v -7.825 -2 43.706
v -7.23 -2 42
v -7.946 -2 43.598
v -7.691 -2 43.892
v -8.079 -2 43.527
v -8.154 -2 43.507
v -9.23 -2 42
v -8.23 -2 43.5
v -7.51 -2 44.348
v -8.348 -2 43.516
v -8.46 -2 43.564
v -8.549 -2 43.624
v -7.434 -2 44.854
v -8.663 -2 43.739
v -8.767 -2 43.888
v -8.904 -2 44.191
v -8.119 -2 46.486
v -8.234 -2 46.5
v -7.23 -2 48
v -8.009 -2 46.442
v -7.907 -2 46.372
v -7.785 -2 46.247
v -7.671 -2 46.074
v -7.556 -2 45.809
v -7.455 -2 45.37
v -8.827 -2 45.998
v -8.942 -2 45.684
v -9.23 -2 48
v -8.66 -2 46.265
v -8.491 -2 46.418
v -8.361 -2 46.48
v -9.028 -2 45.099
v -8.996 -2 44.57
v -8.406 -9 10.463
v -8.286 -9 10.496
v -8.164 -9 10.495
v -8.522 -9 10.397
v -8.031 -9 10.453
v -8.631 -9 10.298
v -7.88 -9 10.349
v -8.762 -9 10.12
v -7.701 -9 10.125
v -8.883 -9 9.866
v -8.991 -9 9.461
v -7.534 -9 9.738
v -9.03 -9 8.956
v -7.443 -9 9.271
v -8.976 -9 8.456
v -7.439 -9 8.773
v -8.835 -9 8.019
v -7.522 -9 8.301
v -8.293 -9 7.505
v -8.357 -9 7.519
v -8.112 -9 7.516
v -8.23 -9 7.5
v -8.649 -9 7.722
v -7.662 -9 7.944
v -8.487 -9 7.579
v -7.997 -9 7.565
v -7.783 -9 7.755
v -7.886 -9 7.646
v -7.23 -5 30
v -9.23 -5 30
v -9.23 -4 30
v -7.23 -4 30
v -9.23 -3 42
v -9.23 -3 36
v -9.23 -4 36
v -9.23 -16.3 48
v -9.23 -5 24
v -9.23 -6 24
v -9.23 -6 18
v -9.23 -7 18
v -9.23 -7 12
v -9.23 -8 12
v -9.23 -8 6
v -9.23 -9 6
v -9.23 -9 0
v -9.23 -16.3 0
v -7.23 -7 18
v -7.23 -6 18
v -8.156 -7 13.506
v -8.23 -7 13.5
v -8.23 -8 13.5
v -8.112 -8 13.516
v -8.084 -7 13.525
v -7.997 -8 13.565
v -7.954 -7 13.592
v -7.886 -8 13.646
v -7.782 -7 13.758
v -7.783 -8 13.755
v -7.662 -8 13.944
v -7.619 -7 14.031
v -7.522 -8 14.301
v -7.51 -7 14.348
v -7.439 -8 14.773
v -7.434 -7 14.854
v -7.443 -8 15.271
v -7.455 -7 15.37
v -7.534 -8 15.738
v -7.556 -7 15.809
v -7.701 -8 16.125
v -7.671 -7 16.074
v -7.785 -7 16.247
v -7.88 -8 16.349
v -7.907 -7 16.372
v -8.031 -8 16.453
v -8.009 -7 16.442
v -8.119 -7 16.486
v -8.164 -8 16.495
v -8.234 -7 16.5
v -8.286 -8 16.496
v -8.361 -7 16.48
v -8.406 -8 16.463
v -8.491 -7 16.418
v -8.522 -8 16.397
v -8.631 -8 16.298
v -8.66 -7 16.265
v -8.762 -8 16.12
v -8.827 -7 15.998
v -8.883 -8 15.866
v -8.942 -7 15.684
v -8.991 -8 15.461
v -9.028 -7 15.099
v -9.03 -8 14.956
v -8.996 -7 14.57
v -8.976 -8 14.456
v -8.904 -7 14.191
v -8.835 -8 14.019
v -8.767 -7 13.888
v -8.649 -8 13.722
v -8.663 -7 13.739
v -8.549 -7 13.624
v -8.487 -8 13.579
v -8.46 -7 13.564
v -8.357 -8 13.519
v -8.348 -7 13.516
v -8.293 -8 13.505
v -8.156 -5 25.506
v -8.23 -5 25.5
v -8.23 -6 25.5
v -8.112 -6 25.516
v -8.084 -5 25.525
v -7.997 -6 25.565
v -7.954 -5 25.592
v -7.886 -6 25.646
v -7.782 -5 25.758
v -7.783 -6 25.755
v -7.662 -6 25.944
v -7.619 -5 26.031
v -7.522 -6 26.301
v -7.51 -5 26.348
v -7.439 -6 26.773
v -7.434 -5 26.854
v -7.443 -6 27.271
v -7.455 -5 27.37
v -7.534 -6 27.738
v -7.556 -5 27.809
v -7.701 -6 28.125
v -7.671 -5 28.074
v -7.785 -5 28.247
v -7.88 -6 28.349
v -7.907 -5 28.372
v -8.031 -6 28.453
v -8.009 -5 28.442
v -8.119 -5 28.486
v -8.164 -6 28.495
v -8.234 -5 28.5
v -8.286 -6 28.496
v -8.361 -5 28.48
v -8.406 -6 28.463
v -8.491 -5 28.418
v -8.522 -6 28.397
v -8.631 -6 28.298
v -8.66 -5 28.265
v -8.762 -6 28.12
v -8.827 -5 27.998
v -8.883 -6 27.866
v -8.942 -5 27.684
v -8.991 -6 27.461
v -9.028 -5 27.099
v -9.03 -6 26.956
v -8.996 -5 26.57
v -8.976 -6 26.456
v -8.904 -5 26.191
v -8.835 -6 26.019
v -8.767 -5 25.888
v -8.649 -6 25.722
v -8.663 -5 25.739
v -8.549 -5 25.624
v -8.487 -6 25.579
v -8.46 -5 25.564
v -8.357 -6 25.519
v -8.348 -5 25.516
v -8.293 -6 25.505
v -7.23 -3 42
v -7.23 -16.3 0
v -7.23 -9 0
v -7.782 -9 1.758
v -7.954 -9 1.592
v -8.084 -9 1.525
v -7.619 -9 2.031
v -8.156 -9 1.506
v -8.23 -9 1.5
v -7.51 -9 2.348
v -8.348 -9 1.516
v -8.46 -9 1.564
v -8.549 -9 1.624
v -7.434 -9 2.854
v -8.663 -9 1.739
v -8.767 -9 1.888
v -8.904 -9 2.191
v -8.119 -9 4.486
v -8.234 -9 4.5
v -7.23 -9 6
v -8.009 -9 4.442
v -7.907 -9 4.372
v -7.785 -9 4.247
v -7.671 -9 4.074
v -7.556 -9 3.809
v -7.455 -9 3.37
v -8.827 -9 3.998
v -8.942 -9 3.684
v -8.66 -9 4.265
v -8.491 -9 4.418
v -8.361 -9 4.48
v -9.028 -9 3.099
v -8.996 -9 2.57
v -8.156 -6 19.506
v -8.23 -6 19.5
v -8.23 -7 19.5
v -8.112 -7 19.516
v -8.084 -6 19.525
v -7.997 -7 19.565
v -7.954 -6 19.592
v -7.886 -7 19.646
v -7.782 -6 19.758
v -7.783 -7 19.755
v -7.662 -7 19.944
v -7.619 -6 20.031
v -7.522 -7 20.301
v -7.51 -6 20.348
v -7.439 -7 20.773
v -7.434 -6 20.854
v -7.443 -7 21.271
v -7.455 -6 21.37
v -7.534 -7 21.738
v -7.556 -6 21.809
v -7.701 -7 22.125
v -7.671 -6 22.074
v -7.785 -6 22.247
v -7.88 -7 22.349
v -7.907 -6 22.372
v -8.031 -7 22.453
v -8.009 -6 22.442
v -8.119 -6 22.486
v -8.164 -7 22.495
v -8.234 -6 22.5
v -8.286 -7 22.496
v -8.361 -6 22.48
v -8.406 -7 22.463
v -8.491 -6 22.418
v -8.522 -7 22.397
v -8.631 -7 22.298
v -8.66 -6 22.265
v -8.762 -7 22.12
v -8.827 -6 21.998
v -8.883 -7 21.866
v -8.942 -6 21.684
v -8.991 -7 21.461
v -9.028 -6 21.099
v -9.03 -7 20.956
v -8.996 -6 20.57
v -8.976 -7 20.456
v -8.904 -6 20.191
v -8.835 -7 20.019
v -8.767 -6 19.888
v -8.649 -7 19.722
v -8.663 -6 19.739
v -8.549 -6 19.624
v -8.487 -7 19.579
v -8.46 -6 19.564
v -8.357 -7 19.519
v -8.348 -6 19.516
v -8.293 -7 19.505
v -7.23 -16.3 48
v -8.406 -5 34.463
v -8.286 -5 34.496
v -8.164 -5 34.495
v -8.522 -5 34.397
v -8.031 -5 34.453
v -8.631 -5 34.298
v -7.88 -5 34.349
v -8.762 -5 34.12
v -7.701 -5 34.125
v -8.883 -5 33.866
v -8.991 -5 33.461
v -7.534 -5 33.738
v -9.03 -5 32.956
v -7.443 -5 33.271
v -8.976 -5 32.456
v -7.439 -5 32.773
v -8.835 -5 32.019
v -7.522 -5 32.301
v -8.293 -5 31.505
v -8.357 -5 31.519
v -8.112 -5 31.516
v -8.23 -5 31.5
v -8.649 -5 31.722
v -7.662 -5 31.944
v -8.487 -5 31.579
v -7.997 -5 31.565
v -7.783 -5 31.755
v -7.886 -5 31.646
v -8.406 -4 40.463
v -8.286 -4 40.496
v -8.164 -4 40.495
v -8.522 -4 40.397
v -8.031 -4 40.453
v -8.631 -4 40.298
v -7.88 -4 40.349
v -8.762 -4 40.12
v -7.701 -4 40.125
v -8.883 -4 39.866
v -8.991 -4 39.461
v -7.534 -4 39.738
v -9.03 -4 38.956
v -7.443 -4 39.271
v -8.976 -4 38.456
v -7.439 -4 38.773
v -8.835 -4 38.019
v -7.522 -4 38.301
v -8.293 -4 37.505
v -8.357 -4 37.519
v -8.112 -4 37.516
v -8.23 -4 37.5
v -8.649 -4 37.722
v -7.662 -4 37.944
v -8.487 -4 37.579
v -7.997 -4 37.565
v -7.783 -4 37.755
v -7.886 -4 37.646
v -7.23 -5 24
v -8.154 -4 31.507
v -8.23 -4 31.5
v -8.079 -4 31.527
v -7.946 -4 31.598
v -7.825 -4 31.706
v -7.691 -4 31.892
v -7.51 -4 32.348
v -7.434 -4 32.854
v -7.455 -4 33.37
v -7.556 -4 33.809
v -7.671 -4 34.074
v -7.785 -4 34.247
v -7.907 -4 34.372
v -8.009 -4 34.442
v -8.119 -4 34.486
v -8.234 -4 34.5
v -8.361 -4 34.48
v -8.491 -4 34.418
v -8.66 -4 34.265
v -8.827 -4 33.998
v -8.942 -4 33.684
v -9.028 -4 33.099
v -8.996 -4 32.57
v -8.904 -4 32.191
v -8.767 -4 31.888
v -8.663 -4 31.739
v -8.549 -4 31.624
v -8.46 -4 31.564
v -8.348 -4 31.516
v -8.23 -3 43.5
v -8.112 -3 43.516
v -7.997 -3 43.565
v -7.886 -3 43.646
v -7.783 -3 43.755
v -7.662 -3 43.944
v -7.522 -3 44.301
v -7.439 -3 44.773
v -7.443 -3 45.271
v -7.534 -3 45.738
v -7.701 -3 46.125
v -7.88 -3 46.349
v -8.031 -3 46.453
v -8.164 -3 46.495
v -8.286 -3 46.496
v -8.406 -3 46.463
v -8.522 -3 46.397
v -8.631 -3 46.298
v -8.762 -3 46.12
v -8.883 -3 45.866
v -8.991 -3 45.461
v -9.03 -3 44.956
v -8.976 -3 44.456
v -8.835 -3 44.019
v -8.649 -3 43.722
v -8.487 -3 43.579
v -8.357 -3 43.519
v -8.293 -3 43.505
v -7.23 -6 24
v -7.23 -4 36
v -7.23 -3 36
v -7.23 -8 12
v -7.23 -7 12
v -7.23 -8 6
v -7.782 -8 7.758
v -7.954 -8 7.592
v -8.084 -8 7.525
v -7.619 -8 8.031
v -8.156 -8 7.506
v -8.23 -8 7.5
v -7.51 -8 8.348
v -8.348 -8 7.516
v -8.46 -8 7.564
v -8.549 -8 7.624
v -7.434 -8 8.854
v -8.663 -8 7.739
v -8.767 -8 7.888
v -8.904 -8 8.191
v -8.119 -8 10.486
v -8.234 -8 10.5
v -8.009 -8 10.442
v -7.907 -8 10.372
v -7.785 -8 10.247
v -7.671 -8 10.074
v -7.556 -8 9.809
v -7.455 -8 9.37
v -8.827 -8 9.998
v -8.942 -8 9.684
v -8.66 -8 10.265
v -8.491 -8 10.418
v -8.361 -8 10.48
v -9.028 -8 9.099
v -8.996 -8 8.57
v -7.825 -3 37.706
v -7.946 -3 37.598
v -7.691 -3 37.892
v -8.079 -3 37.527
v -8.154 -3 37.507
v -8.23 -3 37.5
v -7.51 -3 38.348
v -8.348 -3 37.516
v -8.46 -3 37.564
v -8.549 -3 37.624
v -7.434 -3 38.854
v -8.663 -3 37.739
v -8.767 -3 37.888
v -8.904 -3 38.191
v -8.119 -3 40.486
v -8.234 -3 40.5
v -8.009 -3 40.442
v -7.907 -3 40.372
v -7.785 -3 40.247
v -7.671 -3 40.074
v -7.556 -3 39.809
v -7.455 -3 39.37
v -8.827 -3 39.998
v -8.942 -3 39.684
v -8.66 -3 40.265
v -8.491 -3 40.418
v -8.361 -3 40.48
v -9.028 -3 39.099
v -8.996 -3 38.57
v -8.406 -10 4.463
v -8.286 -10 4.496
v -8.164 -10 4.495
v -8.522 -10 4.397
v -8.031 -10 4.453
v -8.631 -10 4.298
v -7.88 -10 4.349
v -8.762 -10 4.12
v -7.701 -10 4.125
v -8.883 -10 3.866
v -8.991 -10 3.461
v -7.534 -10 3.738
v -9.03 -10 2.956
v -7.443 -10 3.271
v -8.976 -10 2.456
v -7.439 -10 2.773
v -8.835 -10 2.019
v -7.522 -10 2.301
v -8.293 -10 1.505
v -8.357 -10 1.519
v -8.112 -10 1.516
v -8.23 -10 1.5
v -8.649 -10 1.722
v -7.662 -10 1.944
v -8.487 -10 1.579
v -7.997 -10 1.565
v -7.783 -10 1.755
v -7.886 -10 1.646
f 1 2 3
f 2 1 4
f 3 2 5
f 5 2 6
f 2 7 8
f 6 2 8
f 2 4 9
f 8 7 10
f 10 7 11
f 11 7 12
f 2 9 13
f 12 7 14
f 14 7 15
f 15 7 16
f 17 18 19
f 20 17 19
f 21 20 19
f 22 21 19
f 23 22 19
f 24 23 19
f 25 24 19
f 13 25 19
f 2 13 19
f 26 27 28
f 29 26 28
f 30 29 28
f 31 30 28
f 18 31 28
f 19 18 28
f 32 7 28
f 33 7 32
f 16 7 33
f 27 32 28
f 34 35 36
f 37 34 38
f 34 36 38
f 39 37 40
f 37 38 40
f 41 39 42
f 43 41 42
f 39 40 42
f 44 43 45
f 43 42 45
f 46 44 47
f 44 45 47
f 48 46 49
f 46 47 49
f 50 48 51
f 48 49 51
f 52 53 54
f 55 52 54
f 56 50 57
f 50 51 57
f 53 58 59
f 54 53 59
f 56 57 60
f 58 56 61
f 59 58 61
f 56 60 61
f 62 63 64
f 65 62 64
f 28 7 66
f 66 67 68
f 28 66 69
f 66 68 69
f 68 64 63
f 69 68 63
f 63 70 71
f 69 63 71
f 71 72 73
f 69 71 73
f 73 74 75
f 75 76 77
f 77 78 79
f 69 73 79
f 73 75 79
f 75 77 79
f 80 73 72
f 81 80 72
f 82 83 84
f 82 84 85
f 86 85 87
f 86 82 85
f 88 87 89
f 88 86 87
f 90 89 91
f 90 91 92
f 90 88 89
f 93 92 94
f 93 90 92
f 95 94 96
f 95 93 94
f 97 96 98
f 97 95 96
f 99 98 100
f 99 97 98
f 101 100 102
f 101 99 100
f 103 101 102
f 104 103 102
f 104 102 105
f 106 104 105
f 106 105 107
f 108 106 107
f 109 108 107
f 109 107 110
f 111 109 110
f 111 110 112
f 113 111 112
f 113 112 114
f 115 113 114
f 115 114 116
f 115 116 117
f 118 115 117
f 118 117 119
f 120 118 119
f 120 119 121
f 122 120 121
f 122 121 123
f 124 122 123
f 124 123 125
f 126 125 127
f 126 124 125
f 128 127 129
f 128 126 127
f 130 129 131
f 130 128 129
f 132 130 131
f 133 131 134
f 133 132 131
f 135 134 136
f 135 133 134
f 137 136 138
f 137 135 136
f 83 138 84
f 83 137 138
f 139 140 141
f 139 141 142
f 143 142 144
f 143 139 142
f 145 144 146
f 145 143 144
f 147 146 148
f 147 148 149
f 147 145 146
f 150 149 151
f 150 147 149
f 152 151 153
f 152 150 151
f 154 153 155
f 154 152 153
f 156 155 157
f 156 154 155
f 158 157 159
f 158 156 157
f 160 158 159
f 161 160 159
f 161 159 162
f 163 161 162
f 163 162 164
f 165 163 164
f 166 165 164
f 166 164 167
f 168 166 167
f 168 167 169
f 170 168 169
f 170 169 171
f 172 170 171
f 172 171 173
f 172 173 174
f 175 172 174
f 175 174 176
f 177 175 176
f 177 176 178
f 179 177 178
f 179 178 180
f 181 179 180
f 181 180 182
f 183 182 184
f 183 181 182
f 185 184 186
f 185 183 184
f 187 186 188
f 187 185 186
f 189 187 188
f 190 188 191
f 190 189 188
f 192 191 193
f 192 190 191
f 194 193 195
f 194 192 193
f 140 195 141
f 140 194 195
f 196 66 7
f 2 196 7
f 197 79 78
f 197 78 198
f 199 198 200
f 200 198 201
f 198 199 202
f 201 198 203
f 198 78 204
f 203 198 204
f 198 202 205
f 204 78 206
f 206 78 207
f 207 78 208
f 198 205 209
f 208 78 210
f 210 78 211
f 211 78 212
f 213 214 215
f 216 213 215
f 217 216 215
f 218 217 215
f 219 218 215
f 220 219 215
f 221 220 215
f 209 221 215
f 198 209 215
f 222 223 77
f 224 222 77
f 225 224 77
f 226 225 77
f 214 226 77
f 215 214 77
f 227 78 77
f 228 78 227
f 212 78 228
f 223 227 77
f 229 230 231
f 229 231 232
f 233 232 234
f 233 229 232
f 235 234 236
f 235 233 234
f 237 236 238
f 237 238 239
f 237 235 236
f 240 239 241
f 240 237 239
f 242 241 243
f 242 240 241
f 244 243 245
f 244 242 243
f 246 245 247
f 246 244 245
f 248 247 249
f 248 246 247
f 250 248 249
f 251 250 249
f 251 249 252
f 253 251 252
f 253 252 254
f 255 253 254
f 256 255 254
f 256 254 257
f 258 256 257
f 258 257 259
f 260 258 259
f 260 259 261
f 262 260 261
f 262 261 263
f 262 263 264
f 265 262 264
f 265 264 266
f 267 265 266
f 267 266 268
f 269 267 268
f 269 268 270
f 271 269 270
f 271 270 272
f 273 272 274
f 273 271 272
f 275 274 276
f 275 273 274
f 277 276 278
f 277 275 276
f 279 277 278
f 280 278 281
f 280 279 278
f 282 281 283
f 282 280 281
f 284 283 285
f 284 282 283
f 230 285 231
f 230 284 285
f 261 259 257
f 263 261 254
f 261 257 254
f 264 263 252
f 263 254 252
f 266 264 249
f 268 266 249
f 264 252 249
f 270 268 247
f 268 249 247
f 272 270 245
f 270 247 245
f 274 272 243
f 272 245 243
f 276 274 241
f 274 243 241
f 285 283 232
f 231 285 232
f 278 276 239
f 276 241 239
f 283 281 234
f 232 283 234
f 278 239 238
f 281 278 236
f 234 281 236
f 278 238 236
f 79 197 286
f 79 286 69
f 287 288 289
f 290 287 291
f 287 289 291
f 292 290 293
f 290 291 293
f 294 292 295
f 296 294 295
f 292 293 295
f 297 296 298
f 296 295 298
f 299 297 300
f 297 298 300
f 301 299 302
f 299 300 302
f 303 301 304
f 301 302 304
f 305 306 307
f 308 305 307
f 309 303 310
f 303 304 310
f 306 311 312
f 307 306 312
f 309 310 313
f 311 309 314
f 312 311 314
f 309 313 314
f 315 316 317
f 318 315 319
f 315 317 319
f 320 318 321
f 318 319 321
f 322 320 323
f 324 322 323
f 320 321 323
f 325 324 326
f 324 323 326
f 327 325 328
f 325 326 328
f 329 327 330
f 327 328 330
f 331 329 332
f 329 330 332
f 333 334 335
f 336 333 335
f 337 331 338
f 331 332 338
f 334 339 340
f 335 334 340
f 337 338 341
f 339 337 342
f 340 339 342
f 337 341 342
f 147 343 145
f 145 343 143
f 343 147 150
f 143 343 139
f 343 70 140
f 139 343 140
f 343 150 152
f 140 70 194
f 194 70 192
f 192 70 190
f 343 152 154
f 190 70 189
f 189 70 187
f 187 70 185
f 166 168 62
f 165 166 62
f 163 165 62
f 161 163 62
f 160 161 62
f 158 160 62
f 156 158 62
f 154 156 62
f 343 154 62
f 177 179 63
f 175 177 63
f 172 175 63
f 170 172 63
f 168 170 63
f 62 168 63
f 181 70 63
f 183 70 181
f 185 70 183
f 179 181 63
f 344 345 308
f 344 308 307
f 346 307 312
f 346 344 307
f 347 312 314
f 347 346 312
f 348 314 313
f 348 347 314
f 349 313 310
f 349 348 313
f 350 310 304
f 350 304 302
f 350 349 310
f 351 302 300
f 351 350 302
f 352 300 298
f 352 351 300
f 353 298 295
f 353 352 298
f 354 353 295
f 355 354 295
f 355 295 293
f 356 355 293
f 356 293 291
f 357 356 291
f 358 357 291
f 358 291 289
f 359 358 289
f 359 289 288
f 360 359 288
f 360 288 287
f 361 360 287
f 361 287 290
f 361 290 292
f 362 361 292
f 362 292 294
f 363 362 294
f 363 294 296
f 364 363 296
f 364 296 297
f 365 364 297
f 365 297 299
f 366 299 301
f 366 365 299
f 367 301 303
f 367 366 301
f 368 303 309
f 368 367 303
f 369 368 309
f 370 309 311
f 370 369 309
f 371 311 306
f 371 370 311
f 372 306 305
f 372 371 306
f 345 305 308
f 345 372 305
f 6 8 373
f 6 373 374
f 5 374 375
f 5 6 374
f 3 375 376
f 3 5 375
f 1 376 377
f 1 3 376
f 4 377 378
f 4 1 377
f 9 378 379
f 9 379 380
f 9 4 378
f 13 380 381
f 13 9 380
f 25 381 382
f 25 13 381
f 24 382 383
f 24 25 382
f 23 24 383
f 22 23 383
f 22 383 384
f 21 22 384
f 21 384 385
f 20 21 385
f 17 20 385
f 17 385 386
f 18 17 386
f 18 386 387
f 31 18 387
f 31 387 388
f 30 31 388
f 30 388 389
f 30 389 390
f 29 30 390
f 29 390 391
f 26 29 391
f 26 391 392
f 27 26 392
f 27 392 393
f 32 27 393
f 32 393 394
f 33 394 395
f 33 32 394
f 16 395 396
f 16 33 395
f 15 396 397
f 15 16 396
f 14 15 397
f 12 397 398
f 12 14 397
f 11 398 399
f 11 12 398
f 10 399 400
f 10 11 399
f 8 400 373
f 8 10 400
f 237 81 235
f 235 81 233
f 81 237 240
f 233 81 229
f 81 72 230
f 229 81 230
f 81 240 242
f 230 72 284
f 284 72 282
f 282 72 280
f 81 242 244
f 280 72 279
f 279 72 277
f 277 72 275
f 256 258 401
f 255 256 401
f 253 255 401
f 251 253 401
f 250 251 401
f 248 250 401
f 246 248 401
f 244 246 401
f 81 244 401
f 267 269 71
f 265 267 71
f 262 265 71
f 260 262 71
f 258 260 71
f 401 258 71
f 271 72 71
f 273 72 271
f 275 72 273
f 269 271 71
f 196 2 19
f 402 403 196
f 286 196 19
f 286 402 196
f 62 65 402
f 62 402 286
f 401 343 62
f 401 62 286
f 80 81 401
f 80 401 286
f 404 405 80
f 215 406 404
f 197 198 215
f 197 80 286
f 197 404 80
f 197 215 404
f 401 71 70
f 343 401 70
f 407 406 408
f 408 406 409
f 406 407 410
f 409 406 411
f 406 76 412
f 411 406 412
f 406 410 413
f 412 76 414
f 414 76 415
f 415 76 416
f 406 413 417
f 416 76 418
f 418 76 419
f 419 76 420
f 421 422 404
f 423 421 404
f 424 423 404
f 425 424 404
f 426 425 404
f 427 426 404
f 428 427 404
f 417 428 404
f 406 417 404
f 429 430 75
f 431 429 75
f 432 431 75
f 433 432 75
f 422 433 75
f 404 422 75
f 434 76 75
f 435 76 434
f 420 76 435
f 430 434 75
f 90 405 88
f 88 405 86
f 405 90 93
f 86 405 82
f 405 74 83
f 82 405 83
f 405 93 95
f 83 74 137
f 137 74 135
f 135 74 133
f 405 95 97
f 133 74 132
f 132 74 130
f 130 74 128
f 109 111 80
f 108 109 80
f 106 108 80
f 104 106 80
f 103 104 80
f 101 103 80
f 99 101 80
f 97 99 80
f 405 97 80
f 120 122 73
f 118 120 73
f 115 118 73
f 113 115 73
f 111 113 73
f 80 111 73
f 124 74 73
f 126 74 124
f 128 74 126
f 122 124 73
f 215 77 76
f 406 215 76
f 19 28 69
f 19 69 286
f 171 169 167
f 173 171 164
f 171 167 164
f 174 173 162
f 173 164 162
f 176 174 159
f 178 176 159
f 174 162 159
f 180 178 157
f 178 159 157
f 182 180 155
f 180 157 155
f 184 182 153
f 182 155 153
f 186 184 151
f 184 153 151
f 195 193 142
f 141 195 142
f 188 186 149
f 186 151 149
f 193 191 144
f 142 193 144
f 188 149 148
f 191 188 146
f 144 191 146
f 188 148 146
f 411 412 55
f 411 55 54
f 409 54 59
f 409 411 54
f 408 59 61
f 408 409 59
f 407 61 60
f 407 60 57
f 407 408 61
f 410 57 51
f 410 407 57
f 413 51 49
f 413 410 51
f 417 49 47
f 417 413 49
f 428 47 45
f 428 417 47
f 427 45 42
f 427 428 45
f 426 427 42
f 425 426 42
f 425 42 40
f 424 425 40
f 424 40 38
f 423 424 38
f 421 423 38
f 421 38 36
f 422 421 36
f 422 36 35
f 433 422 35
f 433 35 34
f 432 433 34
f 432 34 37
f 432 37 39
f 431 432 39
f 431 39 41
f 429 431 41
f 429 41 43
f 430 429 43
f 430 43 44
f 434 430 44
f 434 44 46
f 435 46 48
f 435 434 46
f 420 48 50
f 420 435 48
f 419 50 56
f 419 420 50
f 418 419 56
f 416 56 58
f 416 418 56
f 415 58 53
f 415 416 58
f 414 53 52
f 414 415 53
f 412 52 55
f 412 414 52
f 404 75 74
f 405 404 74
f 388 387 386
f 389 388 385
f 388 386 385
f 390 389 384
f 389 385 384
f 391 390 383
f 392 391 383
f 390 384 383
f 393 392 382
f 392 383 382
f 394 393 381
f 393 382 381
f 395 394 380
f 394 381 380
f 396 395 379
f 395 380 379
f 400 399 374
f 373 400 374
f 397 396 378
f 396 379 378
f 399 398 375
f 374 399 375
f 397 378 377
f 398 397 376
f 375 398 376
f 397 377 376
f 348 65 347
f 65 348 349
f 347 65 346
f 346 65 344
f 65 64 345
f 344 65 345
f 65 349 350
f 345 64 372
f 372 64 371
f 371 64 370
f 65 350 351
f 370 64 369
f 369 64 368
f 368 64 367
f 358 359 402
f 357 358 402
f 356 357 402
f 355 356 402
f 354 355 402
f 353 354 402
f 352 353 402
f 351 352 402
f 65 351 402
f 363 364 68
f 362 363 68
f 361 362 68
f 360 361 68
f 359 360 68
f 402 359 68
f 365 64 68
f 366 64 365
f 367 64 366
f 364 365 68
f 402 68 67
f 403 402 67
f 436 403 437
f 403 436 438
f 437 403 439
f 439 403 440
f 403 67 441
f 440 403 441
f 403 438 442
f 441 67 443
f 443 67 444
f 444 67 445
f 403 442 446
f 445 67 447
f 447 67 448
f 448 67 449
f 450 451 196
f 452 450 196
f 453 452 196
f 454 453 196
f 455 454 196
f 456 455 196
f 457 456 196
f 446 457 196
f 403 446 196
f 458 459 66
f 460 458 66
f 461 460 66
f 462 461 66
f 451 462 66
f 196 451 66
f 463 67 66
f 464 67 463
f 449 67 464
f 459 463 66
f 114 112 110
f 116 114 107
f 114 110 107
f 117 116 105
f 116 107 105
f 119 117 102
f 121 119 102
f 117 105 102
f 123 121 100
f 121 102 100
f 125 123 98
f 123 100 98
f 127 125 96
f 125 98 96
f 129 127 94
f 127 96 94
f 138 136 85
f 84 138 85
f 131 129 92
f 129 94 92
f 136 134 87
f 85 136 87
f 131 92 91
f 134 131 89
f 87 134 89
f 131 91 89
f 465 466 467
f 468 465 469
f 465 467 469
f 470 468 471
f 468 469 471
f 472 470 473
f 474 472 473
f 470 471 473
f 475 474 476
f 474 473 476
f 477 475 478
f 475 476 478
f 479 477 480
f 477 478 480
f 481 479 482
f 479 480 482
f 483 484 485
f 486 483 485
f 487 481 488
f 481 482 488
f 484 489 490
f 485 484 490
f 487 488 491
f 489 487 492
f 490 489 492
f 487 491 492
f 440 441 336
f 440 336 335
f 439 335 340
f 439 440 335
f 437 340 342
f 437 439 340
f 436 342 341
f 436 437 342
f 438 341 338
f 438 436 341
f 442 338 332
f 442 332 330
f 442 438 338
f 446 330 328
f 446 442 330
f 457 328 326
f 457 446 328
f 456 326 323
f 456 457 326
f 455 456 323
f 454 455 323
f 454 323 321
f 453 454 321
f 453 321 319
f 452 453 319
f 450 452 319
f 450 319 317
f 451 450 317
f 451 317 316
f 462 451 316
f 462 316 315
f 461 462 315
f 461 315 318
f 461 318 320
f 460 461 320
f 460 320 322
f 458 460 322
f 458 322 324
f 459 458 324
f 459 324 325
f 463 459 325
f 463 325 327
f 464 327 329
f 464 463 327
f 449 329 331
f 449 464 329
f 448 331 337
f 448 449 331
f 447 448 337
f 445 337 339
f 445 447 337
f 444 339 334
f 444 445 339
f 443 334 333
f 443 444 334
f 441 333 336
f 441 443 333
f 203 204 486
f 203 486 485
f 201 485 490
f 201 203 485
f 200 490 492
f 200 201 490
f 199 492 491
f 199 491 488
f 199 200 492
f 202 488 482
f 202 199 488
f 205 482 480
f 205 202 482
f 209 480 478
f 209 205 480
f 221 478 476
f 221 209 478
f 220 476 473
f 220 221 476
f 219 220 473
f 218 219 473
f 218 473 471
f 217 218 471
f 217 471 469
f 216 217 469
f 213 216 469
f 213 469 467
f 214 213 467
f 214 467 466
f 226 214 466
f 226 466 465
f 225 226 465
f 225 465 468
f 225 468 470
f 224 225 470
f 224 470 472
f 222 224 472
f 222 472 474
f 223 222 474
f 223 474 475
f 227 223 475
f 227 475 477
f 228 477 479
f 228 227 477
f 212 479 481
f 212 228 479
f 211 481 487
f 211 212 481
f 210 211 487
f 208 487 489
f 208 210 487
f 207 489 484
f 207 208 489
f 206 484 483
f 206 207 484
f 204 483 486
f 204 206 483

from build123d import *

# Parameters (mm, degrees)
BOSS_EXTRUDE1_DEPTH      = 48
CUT_EXTRUDE4_DEPTH       = 2
CUT_EXTRUDE6_DEPTH       = 9
CUT_EXTRUDE6_DEPTH_BACK  = 1
SKETCH8_RX               = 1.5
SKETCH8_RY               = 0.8
CUT_EXTRUDE7_DEPTH       = 11
CUT_EXTRUDE7_DEPTH_BACK  = 1
SKETCH13_RX              = 1.5
SKETCH13_RY              = 0.8
CUT_EXTRUDE8_DEPTH       = 13
CUT_EXTRUDE8_DEPTH_BACK  = 1
SKETCH14_RX              = 1.5
SKETCH14_RY              = 0.8
CUT_EXTRUDE9_DEPTH       = 15
CUT_EXTRUDE9_DEPTH_BACK  = 1
SKETCH15_RX              = 1.5
SKETCH15_RY              = 0.8
CUT_EXTRUDE10_DEPTH      = 17
CUT_EXTRUDE10_DEPTH_BACK = 1
SKETCH16_RX              = 1.5
SKETCH16_RY              = 0.8
CUT_EXTRUDE11_DEPTH      = 19
CUT_EXTRUDE11_DEPTH_BACK = 1
SKETCH17_RX              = 1.5
SKETCH17_RY              = 0.8
CUT_EXTRUDE12_DEPTH      = 21
CUT_EXTRUDE12_DEPTH_BACK = 1
SKETCH18_RX              = 1.5
SKETCH18_RY              = 0.8
CUT_EXTRUDE13_DEPTH      = 23
CUT_EXTRUDE13_DEPTH_BACK = 1
SKETCH19_RX              = 1.5
SKETCH19_RY              = 0.8
SKETCH21_W               = 58.141640115
SKETCH21_H               = 26.059597095
CUT_EXTRUDE14_DEPTH      = 22
BODY_MOVE_COPY1_ANGLE    = 180


with BuildPart() as part:
    # Sketch2 → Boss-Extrude1 (new body)
    with BuildSketch(Plane.XY):
        Polygon((-7.23, -20.3), (-7.23, -34), (-9.23, -34), (-9.23, -2), (-7.23, -2), align=None)
    extrude(amount=BOSS_EXTRUDE1_DEPTH)

    # Sketch7 → Cut-Extrude4 (cut)
    with BuildSketch(Plane(origin=(-7.23, 0, 0), x_dir=(0, 0, -1), z_dir=(1, 0, 0))):
        Polygon((-48, -16.3), (-48, -24.3), (-42, -24.3), (-42, -25.3), (-36, -25.3), (-36, -26.3), (-30, -26.3), (-30, -27.3), (-24, -27.3), (-24, -28.3), (-18, -28.3), (-18, -29.3), (-12, -29.3), (-12, -30.3), (-6, -30.3), (-6, -31.3), (0, -31.3), (0, -9.3), (-6, -9.3), (-6, -10.3), (-12, -10.3), (-12, -11.3), (-18, -11.3), (-18, -12.3), (-24, -12.3), (-24, -13.3), (-30, -13.3), (-30, -14.3), (-36, -14.3), (-36, -15.3), (-42, -15.3), (-42, -16.3), align=None)
    extrude(amount=-CUT_EXTRUDE4_DEPTH, mode=Mode.SUBTRACT)


with BuildPart() as cut_extrude4_piece_1:
    # of the separate pieces the step leaves, piece 1, a body of its own (cut_extrude4_pieces)
    add(part.part.solids().sort_by_distance((-7.23, -9.3, 0))[0])


with BuildPart() as cut_extrude4_piece_2:
    # of the separate pieces the step leaves, piece 2, a body of its own (cut_extrude4_pieces)
    add(part.part.solids().sort_by_distance((-7.23, -34, 0))[0])


with BuildPart() as cut_extrude6_tool:
    # Sketch8 → Cut-Extrude6 (new, two sides: drawn at the far end of the back side and taken through both)
    with BuildSketch(Plane(origin=(0, -24.3, 0), x_dir=(1, 0, 0), z_dir=(0, 1, 0)).offset(-CUT_EXTRUDE6_DEPTH_BACK)):
        with Locations(Location((-8.23, -45), (0, 0, 90))):
            Ellipse(SKETCH8_RX, SKETCH8_RY)
    extrude(amount=CUT_EXTRUDE6_DEPTH + CUT_EXTRUDE6_DEPTH_BACK)


with BuildPart() as cut_extrude4_piece_1_1:
    add(cut_extrude4_piece_1.part)

    # Cut-Extrude6: cut by cut_extrude6_tool
    add(cut_extrude6_tool.part, mode=Mode.SUBTRACT)


with BuildPart() as cut_extrude4_piece_2_1:
    add(cut_extrude4_piece_2.part)

    # Cut-Extrude6: cut by cut_extrude6_tool
    add(cut_extrude6_tool.part, mode=Mode.SUBTRACT)


with BuildPart() as cut_extrude7_tool:
    # Sketch13 → Cut-Extrude7 (new, two sides: drawn at the far end of the back side and taken through both)
    with BuildSketch(Plane(origin=(0, -25.3, 0), x_dir=(1, 0, 0), z_dir=(0, 1, 0)).offset(-CUT_EXTRUDE7_DEPTH_BACK)):
        with Locations(Location((-8.23, -39), (0, 0, 90))):
            Ellipse(SKETCH13_RX, SKETCH13_RY)
    extrude(amount=CUT_EXTRUDE7_DEPTH + CUT_EXTRUDE7_DEPTH_BACK)


with BuildPart() as cut_extrude4_piece_1_2:
    add(cut_extrude4_piece_1_1.part)

    # Cut-Extrude7: cut by cut_extrude7_tool
    add(cut_extrude7_tool.part, mode=Mode.SUBTRACT)


with BuildPart() as cut_extrude4_piece_2_2:
    add(cut_extrude4_piece_2_1.part)

    # Cut-Extrude7: cut by cut_extrude7_tool
    add(cut_extrude7_tool.part, mode=Mode.SUBTRACT)


with BuildPart() as cut_extrude8_tool:
    # Sketch14 → Cut-Extrude8 (new, two sides: drawn at the far end of the back side and taken through both)
    with BuildSketch(Plane(origin=(0, -26.3, 0), x_dir=(1, 0, 0), z_dir=(0, 1, 0)).offset(-CUT_EXTRUDE8_DEPTH_BACK)):
        with Locations(Location((-8.23, -33), (0, 0, 90))):
            Ellipse(SKETCH14_RX, SKETCH14_RY)
    extrude(amount=CUT_EXTRUDE8_DEPTH + CUT_EXTRUDE8_DEPTH_BACK)


with BuildPart() as cut_extrude4_piece_1_3:
    add(cut_extrude4_piece_1_2.part)

    # Cut-Extrude8: cut by cut_extrude8_tool
    add(cut_extrude8_tool.part, mode=Mode.SUBTRACT)


with BuildPart() as cut_extrude4_piece_2_3:
    add(cut_extrude4_piece_2_2.part)

    # Cut-Extrude8: cut by cut_extrude8_tool
    add(cut_extrude8_tool.part, mode=Mode.SUBTRACT)


with BuildPart() as cut_extrude9_tool:
    # Sketch15 → Cut-Extrude9 (new, two sides: drawn at the far end of the back side and taken through both)
    with BuildSketch(Plane(origin=(0, -27.3, 0), x_dir=(1, 0, 0), z_dir=(0, 1, 0)).offset(-CUT_EXTRUDE9_DEPTH_BACK)):
        with Locations(Location((-8.23, -27), (0, 0, 90))):
            Ellipse(SKETCH15_RX, SKETCH15_RY)
    extrude(amount=CUT_EXTRUDE9_DEPTH + CUT_EXTRUDE9_DEPTH_BACK)


with BuildPart() as cut_extrude4_piece_1_4:
    add(cut_extrude4_piece_1_3.part)

    # Cut-Extrude9: cut by cut_extrude9_tool
    add(cut_extrude9_tool.part, mode=Mode.SUBTRACT)


with BuildPart() as cut_extrude4_piece_2_4:
    add(cut_extrude4_piece_2_3.part)

    # Cut-Extrude9: cut by cut_extrude9_tool
    add(cut_extrude9_tool.part, mode=Mode.SUBTRACT)


with BuildPart() as cut_extrude10_tool:
    # Sketch16 → Cut-Extrude10 (new, two sides: drawn at the far end of the back side and taken through both)
    with BuildSketch(Plane(origin=(0, -28.3, 0), x_dir=(1, 0, 0), z_dir=(0, 1, 0)).offset(-CUT_EXTRUDE10_DEPTH_BACK)):
        with Locations(Location((-8.23, -21), (0, 0, 90))):
            Ellipse(SKETCH16_RX, SKETCH16_RY)
    extrude(amount=CUT_EXTRUDE10_DEPTH + CUT_EXTRUDE10_DEPTH_BACK)


with BuildPart() as cut_extrude4_piece_1_5:
    add(cut_extrude4_piece_1_4.part)

    # Cut-Extrude10: cut by cut_extrude10_tool
    add(cut_extrude10_tool.part, mode=Mode.SUBTRACT)


with BuildPart() as cut_extrude4_piece_2_5:
    add(cut_extrude4_piece_2_4.part)

    # Cut-Extrude10: cut by cut_extrude10_tool
    add(cut_extrude10_tool.part, mode=Mode.SUBTRACT)


with BuildPart() as cut_extrude11_tool:
    # Sketch17 → Cut-Extrude11 (new, two sides: drawn at the far end of the back side and taken through both)
    with BuildSketch(Plane(origin=(0, -29.3, 0), x_dir=(1, 0, 0), z_dir=(0, 1, 0)).offset(-CUT_EXTRUDE11_DEPTH_BACK)):
        with Locations(Location((-8.23, -15), (0, 0, 90))):
            Ellipse(SKETCH17_RX, SKETCH17_RY)
    extrude(amount=CUT_EXTRUDE11_DEPTH + CUT_EXTRUDE11_DEPTH_BACK)


with BuildPart() as cut_extrude4_piece_1_6:
    add(cut_extrude4_piece_1_5.part)

    # Cut-Extrude11: cut by cut_extrude11_tool
    add(cut_extrude11_tool.part, mode=Mode.SUBTRACT)


with BuildPart() as cut_extrude4_piece_2_6:
    add(cut_extrude4_piece_2_5.part)

    # Cut-Extrude11: cut by cut_extrude11_tool
    add(cut_extrude11_tool.part, mode=Mode.SUBTRACT)


with BuildPart() as cut_extrude12_tool:
    # Sketch18 → Cut-Extrude12 (new, two sides: drawn at the far end of the back side and taken through both)
    with BuildSketch(Plane(origin=(0, -30.3, 0), x_dir=(1, 0, 0), z_dir=(0, 1, 0)).offset(-CUT_EXTRUDE12_DEPTH_BACK)):
        with Locations(Location((-8.23, -9), (0, 0, 90))):
            Ellipse(SKETCH18_RX, SKETCH18_RY)
    extrude(amount=CUT_EXTRUDE12_DEPTH + CUT_EXTRUDE12_DEPTH_BACK)


with BuildPart() as cut_extrude4_piece_1_7:
    add(cut_extrude4_piece_1_6.part)

    # Cut-Extrude12: cut by cut_extrude12_tool
    add(cut_extrude12_tool.part, mode=Mode.SUBTRACT)


with BuildPart() as cut_extrude4_piece_2_7:
    add(cut_extrude4_piece_2_6.part)

    # Cut-Extrude12: cut by cut_extrude12_tool
    add(cut_extrude12_tool.part, mode=Mode.SUBTRACT)


with BuildPart() as cut_extrude13_tool:
    # Sketch19 → Cut-Extrude13 (new, two sides: drawn at the far end of the back side and taken through both)
    with BuildSketch(Plane(origin=(0, -31.3, 0), x_dir=(1, 0, 0), z_dir=(0, 1, 0)).offset(-CUT_EXTRUDE13_DEPTH_BACK)):
        with Locations(Location((-8.23, -3), (0, 0, 90))):
            Ellipse(SKETCH19_RX, SKETCH19_RY)
    extrude(amount=CUT_EXTRUDE13_DEPTH + CUT_EXTRUDE13_DEPTH_BACK)


with BuildPart() as cut_extrude4_piece_1_8:
    add(cut_extrude4_piece_1_7.part)

    # Cut-Extrude13: cut by cut_extrude13_tool
    add(cut_extrude13_tool.part, mode=Mode.SUBTRACT)


with BuildPart() as cut_extrude4_piece_2_8:
    add(cut_extrude4_piece_2_7.part)

    # Cut-Extrude13: cut by cut_extrude13_tool
    add(cut_extrude13_tool.part, mode=Mode.SUBTRACT)

    # Sketch21 → Cut-Extrude14 (cut)
    with BuildSketch(Plane(origin=(0, 0, 0), x_dir=(0, 0, -1), z_dir=(1, 0, 0))):
        with Locations((-20.055207527, -35.194061722)):
            Rectangle(SKETCH21_W, SKETCH21_H)
    extrude(amount=-CUT_EXTRUDE14_DEPTH, mode=Mode.SUBTRACT)


with BuildPart() as cut_extrude4_piece_1_9:
    # Body-Move/Copy1: moved
    add(cut_extrude4_piece_1_8.part.rotate(Axis((-8.23, -9.15, 0), (0, 0, 1)), BODY_MOVE_COPY1_ANGLE))


solid = cut_extrude4_piece_1_9.part
